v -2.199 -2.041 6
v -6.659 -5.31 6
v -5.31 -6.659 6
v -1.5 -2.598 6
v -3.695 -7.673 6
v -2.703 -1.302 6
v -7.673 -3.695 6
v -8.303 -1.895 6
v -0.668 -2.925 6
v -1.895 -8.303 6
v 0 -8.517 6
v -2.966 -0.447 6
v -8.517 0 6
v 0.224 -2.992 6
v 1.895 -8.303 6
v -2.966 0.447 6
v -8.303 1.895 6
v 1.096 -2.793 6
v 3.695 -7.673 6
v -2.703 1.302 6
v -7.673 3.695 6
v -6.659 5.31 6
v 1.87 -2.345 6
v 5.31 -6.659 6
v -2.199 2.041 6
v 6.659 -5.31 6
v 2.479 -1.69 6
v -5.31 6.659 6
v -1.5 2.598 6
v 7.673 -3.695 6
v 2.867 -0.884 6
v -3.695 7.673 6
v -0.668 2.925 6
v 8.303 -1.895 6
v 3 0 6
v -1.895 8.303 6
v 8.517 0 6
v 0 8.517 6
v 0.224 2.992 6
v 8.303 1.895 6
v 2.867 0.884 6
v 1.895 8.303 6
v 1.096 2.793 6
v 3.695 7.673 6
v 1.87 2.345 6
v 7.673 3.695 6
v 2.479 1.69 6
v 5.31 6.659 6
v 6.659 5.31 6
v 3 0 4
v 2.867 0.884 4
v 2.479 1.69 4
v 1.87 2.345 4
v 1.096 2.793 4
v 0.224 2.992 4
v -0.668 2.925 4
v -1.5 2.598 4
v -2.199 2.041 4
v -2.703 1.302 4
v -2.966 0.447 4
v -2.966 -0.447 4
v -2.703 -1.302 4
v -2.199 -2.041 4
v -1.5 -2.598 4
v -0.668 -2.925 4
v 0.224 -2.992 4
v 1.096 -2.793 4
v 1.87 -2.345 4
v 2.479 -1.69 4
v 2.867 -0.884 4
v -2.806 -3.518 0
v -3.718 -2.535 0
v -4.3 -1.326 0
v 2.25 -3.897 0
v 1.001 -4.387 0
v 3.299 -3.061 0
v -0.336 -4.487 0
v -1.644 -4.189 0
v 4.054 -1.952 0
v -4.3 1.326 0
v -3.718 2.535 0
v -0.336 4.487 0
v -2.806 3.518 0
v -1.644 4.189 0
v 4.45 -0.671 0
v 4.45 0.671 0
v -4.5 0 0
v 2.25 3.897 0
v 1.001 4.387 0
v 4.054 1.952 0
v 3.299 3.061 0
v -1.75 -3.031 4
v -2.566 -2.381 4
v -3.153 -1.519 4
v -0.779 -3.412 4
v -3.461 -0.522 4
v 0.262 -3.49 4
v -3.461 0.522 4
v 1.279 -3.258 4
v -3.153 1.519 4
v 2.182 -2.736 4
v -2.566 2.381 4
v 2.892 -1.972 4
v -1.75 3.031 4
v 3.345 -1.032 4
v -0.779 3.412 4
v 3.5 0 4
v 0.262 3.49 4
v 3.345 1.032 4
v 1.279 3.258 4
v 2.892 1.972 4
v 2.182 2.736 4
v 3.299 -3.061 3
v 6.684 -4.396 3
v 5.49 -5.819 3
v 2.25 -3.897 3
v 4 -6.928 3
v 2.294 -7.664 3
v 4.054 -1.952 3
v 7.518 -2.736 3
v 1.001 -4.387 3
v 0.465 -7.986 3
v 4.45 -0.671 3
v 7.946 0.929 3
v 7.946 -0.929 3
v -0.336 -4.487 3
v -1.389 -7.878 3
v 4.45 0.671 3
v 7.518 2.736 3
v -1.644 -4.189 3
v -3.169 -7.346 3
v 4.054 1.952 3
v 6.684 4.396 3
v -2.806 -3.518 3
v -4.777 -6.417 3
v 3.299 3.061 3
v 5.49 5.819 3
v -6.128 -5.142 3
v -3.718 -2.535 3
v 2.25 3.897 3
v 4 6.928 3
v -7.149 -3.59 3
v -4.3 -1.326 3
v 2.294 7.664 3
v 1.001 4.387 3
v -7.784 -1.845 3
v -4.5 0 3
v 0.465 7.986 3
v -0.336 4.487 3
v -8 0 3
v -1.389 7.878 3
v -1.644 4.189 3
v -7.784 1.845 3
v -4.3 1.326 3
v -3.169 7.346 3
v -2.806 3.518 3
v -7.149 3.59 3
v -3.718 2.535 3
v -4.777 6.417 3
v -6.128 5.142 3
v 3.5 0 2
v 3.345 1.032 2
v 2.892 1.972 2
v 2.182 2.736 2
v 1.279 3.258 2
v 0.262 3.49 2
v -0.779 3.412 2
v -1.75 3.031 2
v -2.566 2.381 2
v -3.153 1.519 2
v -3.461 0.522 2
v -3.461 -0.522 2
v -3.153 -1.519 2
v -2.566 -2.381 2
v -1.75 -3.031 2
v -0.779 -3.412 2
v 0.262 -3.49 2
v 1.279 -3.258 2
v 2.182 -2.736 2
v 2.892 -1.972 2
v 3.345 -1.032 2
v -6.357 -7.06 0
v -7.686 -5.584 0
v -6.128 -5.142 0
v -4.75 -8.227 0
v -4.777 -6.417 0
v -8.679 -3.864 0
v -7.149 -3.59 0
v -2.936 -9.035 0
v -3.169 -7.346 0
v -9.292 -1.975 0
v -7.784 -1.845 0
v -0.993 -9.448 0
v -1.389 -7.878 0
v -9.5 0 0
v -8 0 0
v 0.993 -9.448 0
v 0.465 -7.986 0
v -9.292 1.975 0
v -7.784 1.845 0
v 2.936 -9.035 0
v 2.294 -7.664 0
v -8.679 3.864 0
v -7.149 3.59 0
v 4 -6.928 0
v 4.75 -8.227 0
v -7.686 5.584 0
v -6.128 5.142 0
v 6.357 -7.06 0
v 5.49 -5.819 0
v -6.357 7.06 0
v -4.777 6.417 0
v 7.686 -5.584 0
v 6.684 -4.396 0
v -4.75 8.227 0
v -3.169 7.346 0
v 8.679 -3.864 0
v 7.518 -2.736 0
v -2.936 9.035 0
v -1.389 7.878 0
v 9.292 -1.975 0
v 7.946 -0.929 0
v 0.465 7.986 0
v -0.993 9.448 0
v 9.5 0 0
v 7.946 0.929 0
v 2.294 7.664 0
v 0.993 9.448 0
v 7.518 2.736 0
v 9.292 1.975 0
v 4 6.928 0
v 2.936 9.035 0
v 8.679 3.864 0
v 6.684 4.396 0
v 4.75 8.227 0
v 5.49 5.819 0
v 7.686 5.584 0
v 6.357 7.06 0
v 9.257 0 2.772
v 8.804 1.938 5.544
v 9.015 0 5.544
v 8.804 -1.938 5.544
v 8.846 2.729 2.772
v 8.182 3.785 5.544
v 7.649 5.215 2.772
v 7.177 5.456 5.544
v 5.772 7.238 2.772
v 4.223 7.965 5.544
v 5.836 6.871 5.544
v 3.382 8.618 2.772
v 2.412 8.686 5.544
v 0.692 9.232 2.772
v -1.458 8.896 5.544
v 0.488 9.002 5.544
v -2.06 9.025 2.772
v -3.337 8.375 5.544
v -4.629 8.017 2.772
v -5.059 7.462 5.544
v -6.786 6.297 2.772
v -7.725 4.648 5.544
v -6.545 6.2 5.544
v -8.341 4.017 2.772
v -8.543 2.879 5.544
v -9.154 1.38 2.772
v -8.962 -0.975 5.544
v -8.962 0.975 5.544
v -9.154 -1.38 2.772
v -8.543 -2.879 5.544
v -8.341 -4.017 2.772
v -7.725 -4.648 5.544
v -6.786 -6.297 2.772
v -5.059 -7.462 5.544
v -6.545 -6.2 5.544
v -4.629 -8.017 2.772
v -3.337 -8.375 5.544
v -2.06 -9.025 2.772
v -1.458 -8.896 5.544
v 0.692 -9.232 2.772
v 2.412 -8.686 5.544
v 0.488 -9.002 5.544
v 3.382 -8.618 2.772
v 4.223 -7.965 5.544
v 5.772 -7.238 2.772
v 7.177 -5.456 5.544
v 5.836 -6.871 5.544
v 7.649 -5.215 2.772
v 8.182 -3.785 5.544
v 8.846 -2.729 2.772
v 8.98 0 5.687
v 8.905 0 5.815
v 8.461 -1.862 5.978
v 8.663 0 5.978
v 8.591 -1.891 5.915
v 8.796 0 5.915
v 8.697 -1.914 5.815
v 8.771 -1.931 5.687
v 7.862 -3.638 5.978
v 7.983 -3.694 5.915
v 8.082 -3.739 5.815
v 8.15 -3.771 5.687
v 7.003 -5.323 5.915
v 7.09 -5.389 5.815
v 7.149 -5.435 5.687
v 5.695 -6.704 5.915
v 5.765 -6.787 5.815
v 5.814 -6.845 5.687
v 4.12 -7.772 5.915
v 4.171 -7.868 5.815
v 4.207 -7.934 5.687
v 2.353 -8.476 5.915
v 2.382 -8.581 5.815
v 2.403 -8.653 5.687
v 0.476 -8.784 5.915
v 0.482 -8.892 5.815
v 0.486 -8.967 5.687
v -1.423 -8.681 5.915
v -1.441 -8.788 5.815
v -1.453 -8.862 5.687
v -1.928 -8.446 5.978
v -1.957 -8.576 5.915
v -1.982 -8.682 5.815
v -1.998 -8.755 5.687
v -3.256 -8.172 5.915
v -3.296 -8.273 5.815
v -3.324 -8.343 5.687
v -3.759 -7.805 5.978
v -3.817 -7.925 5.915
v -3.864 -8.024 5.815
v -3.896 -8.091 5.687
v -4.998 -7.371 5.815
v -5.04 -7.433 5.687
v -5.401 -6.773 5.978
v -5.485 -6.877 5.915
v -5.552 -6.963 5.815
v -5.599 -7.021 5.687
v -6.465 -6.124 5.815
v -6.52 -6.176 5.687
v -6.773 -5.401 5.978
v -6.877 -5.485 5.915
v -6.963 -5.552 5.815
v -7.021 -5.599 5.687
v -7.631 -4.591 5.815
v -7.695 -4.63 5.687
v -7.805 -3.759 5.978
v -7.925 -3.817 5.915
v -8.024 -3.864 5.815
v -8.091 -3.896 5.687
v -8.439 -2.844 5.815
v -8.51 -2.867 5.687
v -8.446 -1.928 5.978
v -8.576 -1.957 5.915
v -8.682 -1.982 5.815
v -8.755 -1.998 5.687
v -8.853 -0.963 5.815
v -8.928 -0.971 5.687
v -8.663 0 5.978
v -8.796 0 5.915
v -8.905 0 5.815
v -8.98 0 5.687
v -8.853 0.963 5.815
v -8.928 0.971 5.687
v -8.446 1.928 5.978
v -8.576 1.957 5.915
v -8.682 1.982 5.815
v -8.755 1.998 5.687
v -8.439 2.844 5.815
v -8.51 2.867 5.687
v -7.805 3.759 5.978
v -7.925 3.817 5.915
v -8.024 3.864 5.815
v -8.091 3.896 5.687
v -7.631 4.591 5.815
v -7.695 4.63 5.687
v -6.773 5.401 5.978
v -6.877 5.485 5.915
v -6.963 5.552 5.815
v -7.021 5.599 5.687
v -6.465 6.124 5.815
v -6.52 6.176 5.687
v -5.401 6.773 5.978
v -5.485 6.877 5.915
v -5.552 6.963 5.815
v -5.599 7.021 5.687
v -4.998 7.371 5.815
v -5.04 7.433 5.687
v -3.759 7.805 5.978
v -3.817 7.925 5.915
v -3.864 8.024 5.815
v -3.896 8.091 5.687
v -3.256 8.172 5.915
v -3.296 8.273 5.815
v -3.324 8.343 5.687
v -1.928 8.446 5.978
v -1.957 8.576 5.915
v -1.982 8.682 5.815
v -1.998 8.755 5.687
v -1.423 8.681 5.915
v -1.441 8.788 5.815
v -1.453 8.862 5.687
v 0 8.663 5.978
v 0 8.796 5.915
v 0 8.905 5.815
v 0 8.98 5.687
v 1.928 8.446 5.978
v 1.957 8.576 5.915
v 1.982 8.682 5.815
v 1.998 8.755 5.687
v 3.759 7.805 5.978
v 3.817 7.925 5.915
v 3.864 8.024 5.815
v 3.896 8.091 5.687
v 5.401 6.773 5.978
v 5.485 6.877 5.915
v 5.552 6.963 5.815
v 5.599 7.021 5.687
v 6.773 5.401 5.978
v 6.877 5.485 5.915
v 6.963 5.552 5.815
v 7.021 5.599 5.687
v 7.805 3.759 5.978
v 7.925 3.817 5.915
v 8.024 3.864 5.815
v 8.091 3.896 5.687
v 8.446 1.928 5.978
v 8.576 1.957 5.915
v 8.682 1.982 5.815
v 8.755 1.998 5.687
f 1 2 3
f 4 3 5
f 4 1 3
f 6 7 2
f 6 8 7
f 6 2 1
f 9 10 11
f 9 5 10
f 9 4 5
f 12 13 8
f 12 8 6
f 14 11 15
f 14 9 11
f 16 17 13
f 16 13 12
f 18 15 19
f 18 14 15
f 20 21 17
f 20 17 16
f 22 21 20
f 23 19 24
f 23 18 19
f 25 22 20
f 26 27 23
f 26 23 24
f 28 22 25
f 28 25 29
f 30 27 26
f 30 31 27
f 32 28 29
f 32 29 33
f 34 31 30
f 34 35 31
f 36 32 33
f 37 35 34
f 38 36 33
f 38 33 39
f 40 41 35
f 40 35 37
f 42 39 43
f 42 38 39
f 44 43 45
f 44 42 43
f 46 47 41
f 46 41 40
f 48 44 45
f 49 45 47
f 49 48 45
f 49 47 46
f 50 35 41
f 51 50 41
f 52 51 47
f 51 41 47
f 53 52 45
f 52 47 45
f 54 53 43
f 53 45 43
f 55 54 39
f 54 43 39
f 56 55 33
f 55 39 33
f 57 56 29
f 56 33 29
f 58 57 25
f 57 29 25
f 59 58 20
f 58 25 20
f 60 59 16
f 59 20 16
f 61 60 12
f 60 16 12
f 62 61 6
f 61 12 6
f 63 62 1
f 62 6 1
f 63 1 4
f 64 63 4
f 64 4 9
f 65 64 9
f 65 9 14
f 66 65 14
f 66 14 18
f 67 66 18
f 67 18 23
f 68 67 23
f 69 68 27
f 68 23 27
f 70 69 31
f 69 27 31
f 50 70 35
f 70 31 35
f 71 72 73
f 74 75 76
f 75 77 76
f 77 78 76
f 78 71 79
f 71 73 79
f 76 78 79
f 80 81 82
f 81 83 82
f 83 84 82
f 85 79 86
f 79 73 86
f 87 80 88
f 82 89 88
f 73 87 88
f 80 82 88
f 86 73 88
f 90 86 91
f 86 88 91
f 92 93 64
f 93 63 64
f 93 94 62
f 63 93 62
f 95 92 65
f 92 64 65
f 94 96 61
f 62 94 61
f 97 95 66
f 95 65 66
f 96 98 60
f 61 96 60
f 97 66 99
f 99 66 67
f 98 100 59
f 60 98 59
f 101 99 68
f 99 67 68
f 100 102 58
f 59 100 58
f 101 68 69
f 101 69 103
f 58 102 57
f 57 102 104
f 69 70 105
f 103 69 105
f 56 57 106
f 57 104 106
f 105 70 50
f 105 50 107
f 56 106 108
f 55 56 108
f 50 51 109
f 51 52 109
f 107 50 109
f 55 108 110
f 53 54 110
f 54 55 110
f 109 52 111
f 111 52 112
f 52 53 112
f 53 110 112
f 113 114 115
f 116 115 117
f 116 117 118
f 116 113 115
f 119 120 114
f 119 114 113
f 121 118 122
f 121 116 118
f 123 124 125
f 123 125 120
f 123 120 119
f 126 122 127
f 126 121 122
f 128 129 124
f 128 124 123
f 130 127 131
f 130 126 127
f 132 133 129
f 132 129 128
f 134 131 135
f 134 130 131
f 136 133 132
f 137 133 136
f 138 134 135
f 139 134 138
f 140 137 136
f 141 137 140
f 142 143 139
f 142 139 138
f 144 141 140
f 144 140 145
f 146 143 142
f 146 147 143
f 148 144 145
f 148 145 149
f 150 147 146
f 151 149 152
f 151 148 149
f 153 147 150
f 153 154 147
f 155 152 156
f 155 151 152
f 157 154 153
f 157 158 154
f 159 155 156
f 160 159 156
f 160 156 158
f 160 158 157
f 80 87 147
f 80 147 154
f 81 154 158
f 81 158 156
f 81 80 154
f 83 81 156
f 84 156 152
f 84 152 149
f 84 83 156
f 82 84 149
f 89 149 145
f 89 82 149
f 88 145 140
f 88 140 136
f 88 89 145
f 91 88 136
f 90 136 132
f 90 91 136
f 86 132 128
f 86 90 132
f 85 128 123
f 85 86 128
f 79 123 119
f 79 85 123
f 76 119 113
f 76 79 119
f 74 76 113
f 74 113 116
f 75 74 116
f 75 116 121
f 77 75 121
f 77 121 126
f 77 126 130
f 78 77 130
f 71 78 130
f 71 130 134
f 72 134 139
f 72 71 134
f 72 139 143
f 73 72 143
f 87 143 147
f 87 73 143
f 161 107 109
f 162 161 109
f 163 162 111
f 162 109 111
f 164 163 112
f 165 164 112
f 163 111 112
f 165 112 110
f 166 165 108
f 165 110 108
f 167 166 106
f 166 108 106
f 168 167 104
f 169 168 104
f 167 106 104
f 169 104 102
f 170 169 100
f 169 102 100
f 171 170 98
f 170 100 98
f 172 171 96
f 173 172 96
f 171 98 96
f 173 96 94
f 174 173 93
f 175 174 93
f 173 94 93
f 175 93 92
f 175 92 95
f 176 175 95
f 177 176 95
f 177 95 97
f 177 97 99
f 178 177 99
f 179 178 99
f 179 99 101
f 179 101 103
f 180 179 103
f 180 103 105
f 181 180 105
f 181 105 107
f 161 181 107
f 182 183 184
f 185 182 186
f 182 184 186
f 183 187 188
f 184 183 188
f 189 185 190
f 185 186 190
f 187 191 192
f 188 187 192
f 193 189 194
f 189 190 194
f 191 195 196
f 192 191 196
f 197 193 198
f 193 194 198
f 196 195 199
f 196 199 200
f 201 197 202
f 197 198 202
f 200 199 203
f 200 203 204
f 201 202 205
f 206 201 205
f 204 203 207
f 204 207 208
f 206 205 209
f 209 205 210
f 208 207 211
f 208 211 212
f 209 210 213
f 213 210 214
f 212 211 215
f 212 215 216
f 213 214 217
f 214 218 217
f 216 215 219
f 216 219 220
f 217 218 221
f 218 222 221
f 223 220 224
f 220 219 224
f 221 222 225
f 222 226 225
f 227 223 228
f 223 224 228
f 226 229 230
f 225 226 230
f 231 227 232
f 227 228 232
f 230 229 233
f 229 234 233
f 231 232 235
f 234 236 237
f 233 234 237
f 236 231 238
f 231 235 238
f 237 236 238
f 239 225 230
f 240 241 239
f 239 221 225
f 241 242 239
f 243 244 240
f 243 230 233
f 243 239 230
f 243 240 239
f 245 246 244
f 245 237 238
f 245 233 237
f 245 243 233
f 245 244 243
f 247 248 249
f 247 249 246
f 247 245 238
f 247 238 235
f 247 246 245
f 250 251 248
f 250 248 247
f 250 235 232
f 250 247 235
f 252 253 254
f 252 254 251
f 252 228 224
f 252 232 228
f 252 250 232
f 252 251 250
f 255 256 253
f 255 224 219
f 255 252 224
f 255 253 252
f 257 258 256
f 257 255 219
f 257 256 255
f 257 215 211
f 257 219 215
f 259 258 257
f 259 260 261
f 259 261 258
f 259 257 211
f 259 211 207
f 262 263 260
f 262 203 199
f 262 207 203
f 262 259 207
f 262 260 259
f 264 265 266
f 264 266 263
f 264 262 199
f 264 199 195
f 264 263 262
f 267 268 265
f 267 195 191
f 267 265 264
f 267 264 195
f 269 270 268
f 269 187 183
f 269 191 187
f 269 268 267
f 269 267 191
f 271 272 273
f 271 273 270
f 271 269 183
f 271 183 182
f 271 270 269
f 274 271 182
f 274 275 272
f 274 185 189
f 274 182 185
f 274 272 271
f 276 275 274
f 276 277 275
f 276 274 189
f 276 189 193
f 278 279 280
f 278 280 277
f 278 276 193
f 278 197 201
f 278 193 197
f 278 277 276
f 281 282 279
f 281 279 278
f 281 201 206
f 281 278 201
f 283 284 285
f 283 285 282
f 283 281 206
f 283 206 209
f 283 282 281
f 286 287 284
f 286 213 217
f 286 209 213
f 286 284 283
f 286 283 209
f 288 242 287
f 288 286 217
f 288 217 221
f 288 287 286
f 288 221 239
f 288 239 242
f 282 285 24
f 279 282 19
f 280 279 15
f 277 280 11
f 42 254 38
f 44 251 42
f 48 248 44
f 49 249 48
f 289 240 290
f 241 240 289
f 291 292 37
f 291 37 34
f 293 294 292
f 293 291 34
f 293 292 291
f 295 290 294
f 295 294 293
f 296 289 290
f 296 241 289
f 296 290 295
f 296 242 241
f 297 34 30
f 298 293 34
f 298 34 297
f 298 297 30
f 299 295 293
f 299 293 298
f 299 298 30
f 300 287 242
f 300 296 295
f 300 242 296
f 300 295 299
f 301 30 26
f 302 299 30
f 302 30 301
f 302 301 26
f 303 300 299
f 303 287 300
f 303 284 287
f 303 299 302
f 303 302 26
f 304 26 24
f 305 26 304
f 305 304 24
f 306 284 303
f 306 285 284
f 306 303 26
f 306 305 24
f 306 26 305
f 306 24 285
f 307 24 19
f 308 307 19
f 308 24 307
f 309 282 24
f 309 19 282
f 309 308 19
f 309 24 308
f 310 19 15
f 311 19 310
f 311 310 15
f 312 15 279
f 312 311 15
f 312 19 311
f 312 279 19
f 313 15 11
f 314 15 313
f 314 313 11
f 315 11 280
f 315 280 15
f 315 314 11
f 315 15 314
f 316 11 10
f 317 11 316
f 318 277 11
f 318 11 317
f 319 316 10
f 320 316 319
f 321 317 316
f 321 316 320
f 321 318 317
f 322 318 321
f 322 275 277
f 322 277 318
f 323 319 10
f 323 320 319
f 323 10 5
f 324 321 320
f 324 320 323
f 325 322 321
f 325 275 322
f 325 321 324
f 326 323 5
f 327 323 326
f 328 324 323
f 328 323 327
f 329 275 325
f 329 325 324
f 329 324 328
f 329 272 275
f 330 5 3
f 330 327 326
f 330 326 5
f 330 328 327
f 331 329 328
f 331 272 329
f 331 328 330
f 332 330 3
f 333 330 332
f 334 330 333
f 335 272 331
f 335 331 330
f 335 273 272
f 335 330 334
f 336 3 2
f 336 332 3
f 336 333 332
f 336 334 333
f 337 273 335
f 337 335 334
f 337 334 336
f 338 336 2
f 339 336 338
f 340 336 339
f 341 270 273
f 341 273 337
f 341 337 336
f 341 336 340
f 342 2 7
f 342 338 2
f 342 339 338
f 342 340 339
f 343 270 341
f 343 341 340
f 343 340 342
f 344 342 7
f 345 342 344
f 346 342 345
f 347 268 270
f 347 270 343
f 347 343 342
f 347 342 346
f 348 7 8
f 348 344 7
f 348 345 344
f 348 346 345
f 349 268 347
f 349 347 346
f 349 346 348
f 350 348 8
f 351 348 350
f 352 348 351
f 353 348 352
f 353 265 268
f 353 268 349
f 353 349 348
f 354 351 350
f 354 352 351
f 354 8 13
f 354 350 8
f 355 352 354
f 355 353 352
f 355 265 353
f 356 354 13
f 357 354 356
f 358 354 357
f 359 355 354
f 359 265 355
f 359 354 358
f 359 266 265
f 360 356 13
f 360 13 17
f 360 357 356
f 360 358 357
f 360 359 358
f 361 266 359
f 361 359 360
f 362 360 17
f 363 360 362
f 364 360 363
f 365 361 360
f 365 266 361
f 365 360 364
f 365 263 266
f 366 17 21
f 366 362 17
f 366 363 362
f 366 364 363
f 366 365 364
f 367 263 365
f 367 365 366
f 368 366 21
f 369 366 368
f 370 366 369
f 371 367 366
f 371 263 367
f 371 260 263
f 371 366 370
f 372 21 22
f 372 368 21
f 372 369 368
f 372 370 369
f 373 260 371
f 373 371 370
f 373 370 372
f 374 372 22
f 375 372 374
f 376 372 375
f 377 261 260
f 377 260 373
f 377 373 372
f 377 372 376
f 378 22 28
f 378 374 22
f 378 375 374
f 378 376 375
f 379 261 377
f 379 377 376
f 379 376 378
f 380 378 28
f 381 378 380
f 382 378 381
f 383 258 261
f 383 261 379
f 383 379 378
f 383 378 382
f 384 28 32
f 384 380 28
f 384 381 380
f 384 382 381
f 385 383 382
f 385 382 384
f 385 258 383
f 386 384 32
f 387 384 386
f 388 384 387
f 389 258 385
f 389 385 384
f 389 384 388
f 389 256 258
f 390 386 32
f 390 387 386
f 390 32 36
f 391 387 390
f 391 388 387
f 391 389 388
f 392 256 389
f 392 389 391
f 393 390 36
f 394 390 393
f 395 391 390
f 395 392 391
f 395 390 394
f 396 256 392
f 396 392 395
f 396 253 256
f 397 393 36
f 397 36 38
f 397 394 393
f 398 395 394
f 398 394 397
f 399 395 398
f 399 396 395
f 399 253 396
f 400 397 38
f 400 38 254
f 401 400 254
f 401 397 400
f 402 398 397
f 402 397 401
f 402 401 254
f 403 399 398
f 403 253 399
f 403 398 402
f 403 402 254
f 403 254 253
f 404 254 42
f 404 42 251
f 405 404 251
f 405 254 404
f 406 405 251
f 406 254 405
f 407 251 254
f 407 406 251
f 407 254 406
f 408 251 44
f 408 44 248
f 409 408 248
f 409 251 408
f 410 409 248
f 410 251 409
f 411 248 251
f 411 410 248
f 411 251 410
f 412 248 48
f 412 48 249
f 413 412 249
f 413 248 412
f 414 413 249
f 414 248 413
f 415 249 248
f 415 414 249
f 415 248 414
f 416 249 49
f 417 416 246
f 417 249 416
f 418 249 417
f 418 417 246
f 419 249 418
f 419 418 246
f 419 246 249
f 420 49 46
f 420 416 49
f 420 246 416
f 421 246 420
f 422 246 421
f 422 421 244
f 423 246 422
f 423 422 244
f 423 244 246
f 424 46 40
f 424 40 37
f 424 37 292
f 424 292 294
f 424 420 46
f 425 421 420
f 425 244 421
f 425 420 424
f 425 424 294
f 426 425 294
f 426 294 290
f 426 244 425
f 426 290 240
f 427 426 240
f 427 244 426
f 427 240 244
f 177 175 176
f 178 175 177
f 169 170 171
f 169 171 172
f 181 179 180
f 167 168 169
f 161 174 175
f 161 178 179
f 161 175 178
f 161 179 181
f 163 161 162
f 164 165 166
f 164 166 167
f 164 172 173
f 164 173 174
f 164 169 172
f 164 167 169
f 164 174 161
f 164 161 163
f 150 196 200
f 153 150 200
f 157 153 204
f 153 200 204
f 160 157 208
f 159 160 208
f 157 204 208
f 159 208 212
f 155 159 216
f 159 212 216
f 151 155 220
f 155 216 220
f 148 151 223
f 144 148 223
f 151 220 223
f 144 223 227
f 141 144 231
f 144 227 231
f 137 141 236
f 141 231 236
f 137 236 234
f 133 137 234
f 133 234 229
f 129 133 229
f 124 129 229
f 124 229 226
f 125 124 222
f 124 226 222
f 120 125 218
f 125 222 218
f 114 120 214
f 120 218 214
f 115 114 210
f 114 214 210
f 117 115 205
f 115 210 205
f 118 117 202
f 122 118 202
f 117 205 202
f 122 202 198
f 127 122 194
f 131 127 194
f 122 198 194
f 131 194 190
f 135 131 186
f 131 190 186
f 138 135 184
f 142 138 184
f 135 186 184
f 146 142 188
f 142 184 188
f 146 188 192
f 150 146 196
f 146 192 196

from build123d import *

# Parameters (mm, degrees)
SKETCH_1_R          = 9.5
EXTRUDE_1_DEPTH     = 6
EXTRUDE_1_TAPER     = 5
SKETCH_2_R          = 8
SKETCH_2_R_2        = 4.5
CUT_EXTRUDE_2_DEPTH = 3
SKETCH_3_R          = 3.5
CUT_EXTRUDE_3_DEPTH = 4
SKETCH_4_R          = 3.55
SKETCH_4_R_2        = 3
EXTRUDE_2_DEPTH     = 2
FILLET_1_R          = 0.5


with BuildPart() as part:
    # Эскиз1 → Бобышка-Вытянуть1 (new body)
    with BuildSketch(Plane.XY):
        Circle(SKETCH_1_R)
    extrude(amount=EXTRUDE_1_DEPTH, taper=EXTRUDE_1_TAPER)

    # Эскиз2 → Вырез-Вытянуть2 (cut)
    with BuildSketch(Plane(origin=(0, 0, 0), x_dir=(-1, 0, 0), z_dir=(0, 0, -1))):
        Circle(SKETCH_2_R)
        Circle(SKETCH_2_R_2, mode=Mode.SUBTRACT)
    extrude(amount=-CUT_EXTRUDE_2_DEPTH, mode=Mode.SUBTRACT)

    # Эскиз3 → Вырез-Вытянуть3 (cut)
    with BuildSketch(Plane.XY.offset(6)):
        Circle(SKETCH_3_R)
    extrude(amount=-CUT_EXTRUDE_3_DEPTH, mode=Mode.SUBTRACT)

    # Эскиз4 → Бобышка-Вытянуть2 (add)
    with BuildSketch(Plane.XY.offset(6)):
        Circle(SKETCH_4_R)
        Circle(SKETCH_4_R_2, mode=Mode.SUBTRACT)
    extrude(amount=-EXTRUDE_2_DEPTH)

    # Скругление1
    fillet_1_edges = [part.edges().sort_by_distance(p)[0] for p in [
        (-8.975068019, 0, 6),
    ]]
    fillet(fillet_1_edges, radius=FILLET_1_R)


solid = part.part
